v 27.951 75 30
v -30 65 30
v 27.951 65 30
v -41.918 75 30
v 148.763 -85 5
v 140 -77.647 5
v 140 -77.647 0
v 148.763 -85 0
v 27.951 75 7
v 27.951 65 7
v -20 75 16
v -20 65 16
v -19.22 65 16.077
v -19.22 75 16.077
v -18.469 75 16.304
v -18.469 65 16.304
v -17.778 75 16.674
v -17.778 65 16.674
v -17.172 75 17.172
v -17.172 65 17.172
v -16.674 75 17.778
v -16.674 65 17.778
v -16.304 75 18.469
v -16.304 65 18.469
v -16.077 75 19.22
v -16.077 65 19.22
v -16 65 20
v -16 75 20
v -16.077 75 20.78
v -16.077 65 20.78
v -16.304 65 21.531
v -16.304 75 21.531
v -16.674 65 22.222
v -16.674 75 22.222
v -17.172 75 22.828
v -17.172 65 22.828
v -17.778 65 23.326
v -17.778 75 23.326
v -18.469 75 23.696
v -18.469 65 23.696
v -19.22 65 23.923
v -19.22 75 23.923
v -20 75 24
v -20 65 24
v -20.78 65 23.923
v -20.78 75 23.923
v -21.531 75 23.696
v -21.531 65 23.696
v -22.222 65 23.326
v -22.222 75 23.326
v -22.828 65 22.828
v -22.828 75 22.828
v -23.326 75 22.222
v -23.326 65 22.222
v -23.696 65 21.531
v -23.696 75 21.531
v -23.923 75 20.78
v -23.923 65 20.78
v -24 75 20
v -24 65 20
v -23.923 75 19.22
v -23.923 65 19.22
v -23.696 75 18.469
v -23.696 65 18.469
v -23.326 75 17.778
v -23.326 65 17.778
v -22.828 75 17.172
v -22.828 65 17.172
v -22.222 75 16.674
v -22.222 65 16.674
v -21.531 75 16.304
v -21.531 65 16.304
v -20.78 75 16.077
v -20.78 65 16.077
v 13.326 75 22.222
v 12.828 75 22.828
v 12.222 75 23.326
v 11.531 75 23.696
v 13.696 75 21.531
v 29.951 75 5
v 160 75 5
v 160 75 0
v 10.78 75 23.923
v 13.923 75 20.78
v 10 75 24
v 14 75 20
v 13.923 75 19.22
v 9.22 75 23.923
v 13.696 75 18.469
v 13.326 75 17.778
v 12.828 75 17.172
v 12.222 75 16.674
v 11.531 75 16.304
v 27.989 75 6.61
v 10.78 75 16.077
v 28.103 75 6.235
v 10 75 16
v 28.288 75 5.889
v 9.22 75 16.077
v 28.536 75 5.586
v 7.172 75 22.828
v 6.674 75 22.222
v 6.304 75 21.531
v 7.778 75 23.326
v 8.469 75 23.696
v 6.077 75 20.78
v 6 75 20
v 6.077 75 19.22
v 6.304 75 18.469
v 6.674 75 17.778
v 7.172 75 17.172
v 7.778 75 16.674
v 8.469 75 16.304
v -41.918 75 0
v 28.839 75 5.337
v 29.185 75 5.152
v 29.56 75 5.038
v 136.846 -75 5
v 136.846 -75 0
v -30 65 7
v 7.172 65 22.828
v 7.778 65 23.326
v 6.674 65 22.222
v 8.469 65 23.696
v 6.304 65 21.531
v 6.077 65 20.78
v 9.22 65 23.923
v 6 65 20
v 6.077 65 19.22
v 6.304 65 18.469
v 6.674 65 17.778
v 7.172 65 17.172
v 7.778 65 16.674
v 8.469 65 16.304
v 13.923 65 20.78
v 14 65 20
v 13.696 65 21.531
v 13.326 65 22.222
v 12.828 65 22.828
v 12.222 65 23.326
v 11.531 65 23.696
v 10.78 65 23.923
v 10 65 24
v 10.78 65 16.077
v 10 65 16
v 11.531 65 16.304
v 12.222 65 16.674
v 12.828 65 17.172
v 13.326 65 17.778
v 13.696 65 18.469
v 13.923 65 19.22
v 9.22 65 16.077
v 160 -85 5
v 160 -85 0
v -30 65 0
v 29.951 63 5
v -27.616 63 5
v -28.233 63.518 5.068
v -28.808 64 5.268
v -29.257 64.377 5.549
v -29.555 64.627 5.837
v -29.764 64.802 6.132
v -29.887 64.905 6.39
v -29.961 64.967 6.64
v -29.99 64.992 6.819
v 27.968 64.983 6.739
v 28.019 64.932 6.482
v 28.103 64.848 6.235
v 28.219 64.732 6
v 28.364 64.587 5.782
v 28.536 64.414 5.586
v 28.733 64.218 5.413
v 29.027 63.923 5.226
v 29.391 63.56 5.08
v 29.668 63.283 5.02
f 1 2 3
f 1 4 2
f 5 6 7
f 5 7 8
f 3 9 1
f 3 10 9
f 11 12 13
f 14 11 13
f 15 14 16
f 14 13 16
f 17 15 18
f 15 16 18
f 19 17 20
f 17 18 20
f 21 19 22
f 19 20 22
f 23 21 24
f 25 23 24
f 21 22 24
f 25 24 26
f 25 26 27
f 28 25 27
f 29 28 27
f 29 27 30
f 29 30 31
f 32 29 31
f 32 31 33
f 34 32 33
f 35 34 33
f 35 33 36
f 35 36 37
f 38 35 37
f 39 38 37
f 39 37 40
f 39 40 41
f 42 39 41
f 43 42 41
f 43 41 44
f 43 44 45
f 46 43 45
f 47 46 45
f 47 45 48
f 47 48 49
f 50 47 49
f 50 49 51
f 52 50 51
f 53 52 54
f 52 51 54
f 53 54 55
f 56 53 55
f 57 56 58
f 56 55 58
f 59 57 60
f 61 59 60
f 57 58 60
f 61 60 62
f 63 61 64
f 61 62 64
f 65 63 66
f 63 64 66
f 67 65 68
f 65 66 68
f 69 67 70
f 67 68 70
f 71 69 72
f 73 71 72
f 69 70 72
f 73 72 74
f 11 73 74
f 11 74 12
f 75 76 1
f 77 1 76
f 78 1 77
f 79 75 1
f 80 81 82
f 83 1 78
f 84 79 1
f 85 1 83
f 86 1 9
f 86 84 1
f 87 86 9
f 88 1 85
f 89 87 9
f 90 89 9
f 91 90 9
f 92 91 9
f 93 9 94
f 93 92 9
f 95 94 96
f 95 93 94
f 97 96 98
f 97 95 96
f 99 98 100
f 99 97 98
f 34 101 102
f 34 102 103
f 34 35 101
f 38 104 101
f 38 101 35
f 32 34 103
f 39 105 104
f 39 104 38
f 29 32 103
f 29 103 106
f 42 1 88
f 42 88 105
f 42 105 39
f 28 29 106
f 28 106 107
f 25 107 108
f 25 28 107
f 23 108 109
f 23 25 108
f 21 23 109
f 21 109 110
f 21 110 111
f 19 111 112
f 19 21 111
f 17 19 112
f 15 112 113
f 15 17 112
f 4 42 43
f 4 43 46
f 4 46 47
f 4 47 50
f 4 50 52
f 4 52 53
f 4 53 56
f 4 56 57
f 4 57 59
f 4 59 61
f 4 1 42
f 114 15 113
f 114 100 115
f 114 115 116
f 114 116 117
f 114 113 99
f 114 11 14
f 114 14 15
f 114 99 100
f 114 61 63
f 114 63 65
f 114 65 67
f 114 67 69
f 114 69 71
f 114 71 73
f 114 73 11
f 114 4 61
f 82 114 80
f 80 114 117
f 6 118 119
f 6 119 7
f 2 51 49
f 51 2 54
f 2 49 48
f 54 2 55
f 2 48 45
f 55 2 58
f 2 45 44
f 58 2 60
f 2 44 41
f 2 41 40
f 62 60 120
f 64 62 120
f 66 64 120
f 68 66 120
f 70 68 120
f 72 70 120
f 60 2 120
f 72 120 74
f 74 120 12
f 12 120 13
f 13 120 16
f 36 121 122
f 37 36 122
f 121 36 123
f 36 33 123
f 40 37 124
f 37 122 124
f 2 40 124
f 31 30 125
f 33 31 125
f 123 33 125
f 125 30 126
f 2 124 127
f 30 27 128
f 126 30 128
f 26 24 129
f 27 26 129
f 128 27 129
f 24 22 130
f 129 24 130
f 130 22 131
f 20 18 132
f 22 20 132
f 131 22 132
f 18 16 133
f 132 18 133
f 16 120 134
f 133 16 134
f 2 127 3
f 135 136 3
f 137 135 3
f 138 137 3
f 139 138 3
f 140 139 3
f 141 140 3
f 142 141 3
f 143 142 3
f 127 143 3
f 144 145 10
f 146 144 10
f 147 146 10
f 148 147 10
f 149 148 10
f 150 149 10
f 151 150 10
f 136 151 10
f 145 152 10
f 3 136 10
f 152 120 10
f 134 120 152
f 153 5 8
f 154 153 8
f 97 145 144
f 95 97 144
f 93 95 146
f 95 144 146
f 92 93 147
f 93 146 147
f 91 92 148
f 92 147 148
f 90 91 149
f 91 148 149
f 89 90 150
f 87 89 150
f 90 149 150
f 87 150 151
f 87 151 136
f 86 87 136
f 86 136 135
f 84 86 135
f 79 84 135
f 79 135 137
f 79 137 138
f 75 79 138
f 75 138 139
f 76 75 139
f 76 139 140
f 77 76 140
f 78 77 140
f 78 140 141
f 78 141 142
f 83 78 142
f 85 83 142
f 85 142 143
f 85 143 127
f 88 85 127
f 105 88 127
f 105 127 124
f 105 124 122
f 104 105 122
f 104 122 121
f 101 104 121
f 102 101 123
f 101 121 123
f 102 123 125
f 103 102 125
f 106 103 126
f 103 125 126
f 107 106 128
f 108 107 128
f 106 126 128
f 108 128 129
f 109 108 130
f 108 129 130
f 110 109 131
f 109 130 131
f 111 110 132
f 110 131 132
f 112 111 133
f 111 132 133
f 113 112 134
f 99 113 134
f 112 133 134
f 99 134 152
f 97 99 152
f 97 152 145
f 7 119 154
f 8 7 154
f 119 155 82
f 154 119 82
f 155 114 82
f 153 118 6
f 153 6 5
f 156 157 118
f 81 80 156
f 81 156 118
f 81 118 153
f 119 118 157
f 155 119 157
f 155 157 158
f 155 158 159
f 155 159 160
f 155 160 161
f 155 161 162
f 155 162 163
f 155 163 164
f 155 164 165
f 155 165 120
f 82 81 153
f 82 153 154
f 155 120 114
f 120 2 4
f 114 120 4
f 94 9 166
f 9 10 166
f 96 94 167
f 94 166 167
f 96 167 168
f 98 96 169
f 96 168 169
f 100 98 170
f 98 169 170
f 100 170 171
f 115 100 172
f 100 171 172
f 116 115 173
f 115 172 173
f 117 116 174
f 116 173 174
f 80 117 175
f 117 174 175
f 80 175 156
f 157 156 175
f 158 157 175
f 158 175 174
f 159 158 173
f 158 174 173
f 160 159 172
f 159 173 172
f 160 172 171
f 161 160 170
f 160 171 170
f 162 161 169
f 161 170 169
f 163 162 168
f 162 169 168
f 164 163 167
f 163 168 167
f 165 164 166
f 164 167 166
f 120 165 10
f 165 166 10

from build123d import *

# Parameters (mm, degrees)
SKETCH_1_W          = 280
SKETCH_1_H          = 150
EXTRUDE_1_DEPTH     = 5
SKETCH_2_W          = 280
SKETCH_2_H          = 25
EXTRUDE_3_DEPTH     = 10
CUT_EXTRUDE_1_DEPTH = 500
SKETCH_7_R          = 4
CUT_EXTRUDE_2_DEPTH = 1000
SKETCH_8_W          = 112.049433073
SKETCH_8_H          = 25
CUT_EXTRUDE_3_DEPTH = 1000
SKETCH_9_W          = 5
SKETCH_9_H          = 160
EXTRUDE_4_DEPTH     = 20
EXTRUDE_5_DEPTH     = 5
CUT_EXTRUDE_4_DEPTH = 50
FILLET_1_R          = 2
FILLET_2_R          = 2


with BuildPart() as part:
    # 草图1 → 凸台-拉伸1 (new body)
    with BuildSketch(Plane.XY):
        Rectangle(SKETCH_1_W, SKETCH_1_H)
    extrude(amount=EXTRUDE_1_DEPTH)

    # 草图2 → 凸台-拉伸3 (add)
    with BuildSketch(Plane(origin=(0, 75, 0), x_dir=(1, 0, 0), z_dir=(0, 1, 0))):
        with Locations((0, -17.5)):
            Rectangle(SKETCH_2_W, SKETCH_2_H)
    extrude(amount=-EXTRUDE_3_DEPTH)

    # 草图6 → 切除-拉伸1 (cut, symmetric)
    with BuildSketch(Plane.XY.offset(5)):
        Polygon((154.593930268, -89.892698805), (-30, 65), (-77.119612047, 104.53804909), (-170.923908706, 102.008061066), (-172.604783039, -51.581831085), (-172.604783039, -108.521449105), align=None)
    extrude(amount=CUT_EXTRUDE_1_DEPTH, both=True, mode=Mode.SUBTRACT)

    # 草图7 → 切除-拉伸2 (cut)
    with BuildSketch(Plane.XZ.offset(-65)):
        with Locations(Location((-20, 20, 0), (0, 0, 270))):
            Circle(SKETCH_7_R)
        with Locations(Location((10, 20, 0), (0, 0, 270))):
            Circle(SKETCH_7_R)
    extrude(amount=-CUT_EXTRUDE_2_DEPTH, mode=Mode.SUBTRACT)

    # 草图8 → 切除-拉伸3 (cut)
    with BuildSketch(Plane.XZ.offset(-65)):
        with Locations((83.975283464, 17.5)):
            Rectangle(SKETCH_8_W, SKETCH_8_H)
    extrude(amount=-CUT_EXTRUDE_3_DEPTH, mode=Mode.SUBTRACT)

    # 草图9 → 凸台-拉伸4 (add)
    with BuildSketch(Plane(origin=(140, 0, 0), x_dir=(0, 0, -1), z_dir=(1, 0, 0))):
        with Locations((-2.5, -5)):
            Rectangle(SKETCH_9_W, SKETCH_9_H)
    extrude(amount=EXTRUDE_4_DEPTH)

    # 草图10 → 凸台-拉伸5 (add)
    with BuildSketch(Plane.XY.offset(5)):
        Polygon((136.845502963, -75), (140, -77.6469373), (140, -75), align=None)
    extrude(amount=-EXTRUDE_5_DEPTH)

    # 草图11 → 切除-拉伸4 (cut)
    with BuildSketch(Plane.XY.offset(5)):
        Polygon((140, -77.6469373), (159.760548741, -94.228006461), (119.027644691, -86.706463214), align=None)
    extrude(amount=-CUT_EXTRUDE_4_DEPTH, mode=Mode.SUBTRACT)

    # 圆角1
    fillet_1_edges = [part.edges().sort_by_distance(p)[0] for p in [
        (-1.024716536, 65, 5),
    ]]
    fillet(fillet_1_edges, radius=FILLET_1_R)

    # 圆角2
    fillet_2_edges = [part.edges().sort_by_distance(p)[0] for p in [
        (27.950566927, 69, 5),
    ]]
    fillet(fillet_2_edges, radius=FILLET_2_R)


solid = part.part
